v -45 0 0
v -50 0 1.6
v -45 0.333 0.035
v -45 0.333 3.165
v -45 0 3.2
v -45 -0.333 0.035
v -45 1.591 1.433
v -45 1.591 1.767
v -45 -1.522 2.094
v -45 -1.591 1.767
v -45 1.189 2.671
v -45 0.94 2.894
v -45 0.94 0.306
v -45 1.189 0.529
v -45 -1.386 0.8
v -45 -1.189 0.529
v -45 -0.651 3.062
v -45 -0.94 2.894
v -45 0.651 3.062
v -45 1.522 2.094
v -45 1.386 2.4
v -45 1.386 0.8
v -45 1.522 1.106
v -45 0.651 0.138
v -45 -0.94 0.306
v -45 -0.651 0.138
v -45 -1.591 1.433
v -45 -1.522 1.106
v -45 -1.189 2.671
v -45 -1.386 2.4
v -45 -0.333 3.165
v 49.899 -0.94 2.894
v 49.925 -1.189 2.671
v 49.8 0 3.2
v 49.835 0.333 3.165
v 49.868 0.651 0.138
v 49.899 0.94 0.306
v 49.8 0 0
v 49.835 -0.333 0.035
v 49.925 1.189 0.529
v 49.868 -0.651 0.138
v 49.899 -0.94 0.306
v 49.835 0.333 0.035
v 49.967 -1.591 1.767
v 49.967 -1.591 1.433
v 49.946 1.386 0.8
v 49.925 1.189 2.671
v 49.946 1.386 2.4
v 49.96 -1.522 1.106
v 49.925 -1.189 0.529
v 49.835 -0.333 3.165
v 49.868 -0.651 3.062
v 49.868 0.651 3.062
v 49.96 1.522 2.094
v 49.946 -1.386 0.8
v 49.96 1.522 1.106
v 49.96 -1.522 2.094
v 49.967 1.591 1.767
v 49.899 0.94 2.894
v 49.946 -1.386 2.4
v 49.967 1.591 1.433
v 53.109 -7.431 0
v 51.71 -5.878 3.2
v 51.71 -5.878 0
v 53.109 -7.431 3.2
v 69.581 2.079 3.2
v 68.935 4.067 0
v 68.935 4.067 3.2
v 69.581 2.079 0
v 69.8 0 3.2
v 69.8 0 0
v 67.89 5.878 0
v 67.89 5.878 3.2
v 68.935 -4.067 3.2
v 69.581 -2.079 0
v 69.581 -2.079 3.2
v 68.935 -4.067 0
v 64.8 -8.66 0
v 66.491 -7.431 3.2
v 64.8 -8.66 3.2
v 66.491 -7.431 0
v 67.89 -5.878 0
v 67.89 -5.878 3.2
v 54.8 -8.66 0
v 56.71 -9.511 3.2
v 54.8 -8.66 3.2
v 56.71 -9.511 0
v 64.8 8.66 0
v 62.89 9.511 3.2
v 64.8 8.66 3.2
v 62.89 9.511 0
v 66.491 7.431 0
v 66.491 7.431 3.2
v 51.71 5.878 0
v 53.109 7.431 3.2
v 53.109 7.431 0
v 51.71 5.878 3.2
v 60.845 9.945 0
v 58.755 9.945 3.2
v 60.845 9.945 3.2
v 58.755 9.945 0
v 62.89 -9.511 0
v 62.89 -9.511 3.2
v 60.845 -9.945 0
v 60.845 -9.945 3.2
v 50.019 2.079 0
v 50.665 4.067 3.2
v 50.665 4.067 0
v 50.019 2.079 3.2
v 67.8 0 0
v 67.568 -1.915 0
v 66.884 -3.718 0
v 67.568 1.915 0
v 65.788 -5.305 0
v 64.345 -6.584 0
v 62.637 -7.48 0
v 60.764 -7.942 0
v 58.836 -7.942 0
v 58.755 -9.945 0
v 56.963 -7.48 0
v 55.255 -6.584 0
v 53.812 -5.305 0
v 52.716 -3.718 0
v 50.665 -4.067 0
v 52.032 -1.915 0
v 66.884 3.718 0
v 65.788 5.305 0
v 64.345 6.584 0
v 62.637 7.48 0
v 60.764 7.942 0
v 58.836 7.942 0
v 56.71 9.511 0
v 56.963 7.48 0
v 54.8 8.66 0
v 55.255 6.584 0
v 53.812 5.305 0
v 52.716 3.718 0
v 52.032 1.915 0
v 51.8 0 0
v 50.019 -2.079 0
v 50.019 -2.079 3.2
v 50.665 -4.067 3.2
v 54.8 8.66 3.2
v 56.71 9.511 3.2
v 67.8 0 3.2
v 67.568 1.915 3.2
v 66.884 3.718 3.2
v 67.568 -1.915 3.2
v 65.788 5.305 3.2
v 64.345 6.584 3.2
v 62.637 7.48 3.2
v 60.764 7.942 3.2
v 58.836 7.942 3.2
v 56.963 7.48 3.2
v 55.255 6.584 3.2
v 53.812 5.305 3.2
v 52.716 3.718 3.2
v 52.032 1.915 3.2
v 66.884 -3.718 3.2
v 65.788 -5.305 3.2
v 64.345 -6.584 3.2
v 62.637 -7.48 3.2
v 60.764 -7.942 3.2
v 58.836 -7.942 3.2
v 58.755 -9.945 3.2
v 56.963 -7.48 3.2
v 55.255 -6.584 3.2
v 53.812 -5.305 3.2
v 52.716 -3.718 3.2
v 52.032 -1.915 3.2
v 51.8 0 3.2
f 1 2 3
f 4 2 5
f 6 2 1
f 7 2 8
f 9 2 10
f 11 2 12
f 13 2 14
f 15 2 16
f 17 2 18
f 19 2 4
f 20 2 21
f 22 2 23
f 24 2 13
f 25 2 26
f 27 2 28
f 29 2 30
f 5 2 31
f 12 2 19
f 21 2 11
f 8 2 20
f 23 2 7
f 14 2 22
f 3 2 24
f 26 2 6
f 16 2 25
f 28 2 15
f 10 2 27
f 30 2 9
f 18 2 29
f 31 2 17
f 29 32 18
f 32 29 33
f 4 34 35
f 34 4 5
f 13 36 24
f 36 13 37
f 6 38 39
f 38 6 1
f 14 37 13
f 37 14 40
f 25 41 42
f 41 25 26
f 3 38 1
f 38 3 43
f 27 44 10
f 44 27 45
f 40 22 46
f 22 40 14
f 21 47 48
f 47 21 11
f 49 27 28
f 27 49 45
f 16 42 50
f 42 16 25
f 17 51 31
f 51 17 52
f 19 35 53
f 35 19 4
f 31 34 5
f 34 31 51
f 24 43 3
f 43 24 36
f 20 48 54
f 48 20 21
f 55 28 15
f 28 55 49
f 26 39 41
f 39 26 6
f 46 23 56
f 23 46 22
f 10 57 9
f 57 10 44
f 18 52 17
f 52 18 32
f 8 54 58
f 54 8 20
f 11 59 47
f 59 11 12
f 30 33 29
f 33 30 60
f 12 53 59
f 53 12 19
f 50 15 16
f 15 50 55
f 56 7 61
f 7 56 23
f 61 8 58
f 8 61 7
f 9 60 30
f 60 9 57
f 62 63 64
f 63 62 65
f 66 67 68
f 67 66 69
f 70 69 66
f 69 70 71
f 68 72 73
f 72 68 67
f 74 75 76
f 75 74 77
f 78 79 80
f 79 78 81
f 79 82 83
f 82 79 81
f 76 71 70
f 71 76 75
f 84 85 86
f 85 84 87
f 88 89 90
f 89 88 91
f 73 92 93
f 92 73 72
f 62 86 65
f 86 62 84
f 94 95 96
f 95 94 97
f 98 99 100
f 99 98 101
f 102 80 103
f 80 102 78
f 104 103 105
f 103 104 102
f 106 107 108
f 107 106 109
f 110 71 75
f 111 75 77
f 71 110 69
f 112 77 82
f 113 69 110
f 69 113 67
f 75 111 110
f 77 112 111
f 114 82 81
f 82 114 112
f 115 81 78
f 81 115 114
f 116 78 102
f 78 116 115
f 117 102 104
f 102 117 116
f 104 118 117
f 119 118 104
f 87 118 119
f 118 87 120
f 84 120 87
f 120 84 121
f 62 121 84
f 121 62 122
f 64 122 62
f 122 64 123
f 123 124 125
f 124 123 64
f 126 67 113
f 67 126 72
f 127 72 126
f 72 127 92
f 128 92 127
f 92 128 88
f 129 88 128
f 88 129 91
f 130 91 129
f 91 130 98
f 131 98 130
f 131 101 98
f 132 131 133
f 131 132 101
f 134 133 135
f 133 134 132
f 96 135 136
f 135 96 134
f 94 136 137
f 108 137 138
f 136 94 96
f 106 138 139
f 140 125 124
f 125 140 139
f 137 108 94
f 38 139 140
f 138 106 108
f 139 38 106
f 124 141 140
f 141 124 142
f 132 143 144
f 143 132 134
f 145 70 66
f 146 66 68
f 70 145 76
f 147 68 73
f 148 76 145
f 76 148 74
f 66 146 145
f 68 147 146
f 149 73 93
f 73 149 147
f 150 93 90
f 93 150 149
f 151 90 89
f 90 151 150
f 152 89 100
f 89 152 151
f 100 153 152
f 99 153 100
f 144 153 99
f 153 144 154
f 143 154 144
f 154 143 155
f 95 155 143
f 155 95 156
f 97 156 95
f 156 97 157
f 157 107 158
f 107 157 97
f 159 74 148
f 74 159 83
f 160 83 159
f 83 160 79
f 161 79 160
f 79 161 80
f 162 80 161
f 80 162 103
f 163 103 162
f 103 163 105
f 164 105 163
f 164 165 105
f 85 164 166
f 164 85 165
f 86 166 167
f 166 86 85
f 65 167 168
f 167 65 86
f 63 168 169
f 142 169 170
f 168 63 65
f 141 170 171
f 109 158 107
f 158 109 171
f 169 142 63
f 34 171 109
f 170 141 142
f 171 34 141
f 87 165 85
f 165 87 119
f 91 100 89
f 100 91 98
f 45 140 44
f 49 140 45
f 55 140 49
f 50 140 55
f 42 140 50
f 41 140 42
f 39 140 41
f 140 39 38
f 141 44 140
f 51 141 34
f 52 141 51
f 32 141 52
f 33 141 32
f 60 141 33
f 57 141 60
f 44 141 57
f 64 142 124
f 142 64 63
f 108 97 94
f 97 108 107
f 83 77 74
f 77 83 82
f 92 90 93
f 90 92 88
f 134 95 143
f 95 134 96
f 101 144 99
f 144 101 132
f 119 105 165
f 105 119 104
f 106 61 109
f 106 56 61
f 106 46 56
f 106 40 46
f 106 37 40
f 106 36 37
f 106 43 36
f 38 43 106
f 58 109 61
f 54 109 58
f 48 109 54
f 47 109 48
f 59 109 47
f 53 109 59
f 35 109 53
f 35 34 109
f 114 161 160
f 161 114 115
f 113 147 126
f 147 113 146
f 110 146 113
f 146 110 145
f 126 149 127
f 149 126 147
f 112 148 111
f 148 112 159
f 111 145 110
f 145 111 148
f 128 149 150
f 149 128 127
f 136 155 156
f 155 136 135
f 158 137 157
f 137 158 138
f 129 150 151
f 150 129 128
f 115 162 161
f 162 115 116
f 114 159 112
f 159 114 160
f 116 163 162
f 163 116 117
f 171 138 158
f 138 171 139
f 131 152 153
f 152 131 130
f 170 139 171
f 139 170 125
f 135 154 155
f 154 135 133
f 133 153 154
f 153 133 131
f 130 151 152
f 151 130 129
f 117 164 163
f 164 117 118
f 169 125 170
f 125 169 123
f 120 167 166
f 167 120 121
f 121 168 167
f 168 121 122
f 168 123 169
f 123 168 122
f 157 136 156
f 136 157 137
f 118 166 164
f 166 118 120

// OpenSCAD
//
// Straight cocktail stick with round, pointed stick
//
// The "ornament" is just a ring 
//
// by Egil Kvaleberg
//

//*****************************************************************************
// Adjustables

// length of stick
total_length = 100;

// length of cone section
cone_length = 5; 

// diameter of stick
stick_diameter = 3.2;

// size of ornament
ornament_size = 20;

// thickness of ornament
ornament_thickness = 2;

stick_fs = 1*0.1;
ornament_fs = 1*0.5;

//*****************************************************************************
// Derived

stick_radius = stick_diameter / 2;
stick_length = total_length - cone_length;

//*****************************************************************************
// View and printing

view(); 

//*****************************************************************************
// 

module cone()
{
    rotate([0, 90, 0]) cylinder(r1 = 0, r2 = stick_radius, h = cone_length, $fs = stick_fs);
}

module stick()
{
    translate([cone_length, 0, 0]) rotate([0, 90, 0]) cylinder(r = stick_radius, h = stick_length, $fs =stick_fs);
}

module ornament()
{
    difference() {
        cylinder(r = ornament_size/2, h = stick_diameter);
        translate([0, 0, -stick_diameter/2]) cylinder(r = ornament_size/2 - ornament_thickness, h = stick_diameter*2);
    }
}

module view()
{
     translate([-total_length/2, 0, stick_radius]) {
         cone();
         stick();
    }
    translate([total_length/2 + ornament_size/2 - 0.2, 0, 0]) {     
        ornament();
    }
}

//*****************************************************************************
